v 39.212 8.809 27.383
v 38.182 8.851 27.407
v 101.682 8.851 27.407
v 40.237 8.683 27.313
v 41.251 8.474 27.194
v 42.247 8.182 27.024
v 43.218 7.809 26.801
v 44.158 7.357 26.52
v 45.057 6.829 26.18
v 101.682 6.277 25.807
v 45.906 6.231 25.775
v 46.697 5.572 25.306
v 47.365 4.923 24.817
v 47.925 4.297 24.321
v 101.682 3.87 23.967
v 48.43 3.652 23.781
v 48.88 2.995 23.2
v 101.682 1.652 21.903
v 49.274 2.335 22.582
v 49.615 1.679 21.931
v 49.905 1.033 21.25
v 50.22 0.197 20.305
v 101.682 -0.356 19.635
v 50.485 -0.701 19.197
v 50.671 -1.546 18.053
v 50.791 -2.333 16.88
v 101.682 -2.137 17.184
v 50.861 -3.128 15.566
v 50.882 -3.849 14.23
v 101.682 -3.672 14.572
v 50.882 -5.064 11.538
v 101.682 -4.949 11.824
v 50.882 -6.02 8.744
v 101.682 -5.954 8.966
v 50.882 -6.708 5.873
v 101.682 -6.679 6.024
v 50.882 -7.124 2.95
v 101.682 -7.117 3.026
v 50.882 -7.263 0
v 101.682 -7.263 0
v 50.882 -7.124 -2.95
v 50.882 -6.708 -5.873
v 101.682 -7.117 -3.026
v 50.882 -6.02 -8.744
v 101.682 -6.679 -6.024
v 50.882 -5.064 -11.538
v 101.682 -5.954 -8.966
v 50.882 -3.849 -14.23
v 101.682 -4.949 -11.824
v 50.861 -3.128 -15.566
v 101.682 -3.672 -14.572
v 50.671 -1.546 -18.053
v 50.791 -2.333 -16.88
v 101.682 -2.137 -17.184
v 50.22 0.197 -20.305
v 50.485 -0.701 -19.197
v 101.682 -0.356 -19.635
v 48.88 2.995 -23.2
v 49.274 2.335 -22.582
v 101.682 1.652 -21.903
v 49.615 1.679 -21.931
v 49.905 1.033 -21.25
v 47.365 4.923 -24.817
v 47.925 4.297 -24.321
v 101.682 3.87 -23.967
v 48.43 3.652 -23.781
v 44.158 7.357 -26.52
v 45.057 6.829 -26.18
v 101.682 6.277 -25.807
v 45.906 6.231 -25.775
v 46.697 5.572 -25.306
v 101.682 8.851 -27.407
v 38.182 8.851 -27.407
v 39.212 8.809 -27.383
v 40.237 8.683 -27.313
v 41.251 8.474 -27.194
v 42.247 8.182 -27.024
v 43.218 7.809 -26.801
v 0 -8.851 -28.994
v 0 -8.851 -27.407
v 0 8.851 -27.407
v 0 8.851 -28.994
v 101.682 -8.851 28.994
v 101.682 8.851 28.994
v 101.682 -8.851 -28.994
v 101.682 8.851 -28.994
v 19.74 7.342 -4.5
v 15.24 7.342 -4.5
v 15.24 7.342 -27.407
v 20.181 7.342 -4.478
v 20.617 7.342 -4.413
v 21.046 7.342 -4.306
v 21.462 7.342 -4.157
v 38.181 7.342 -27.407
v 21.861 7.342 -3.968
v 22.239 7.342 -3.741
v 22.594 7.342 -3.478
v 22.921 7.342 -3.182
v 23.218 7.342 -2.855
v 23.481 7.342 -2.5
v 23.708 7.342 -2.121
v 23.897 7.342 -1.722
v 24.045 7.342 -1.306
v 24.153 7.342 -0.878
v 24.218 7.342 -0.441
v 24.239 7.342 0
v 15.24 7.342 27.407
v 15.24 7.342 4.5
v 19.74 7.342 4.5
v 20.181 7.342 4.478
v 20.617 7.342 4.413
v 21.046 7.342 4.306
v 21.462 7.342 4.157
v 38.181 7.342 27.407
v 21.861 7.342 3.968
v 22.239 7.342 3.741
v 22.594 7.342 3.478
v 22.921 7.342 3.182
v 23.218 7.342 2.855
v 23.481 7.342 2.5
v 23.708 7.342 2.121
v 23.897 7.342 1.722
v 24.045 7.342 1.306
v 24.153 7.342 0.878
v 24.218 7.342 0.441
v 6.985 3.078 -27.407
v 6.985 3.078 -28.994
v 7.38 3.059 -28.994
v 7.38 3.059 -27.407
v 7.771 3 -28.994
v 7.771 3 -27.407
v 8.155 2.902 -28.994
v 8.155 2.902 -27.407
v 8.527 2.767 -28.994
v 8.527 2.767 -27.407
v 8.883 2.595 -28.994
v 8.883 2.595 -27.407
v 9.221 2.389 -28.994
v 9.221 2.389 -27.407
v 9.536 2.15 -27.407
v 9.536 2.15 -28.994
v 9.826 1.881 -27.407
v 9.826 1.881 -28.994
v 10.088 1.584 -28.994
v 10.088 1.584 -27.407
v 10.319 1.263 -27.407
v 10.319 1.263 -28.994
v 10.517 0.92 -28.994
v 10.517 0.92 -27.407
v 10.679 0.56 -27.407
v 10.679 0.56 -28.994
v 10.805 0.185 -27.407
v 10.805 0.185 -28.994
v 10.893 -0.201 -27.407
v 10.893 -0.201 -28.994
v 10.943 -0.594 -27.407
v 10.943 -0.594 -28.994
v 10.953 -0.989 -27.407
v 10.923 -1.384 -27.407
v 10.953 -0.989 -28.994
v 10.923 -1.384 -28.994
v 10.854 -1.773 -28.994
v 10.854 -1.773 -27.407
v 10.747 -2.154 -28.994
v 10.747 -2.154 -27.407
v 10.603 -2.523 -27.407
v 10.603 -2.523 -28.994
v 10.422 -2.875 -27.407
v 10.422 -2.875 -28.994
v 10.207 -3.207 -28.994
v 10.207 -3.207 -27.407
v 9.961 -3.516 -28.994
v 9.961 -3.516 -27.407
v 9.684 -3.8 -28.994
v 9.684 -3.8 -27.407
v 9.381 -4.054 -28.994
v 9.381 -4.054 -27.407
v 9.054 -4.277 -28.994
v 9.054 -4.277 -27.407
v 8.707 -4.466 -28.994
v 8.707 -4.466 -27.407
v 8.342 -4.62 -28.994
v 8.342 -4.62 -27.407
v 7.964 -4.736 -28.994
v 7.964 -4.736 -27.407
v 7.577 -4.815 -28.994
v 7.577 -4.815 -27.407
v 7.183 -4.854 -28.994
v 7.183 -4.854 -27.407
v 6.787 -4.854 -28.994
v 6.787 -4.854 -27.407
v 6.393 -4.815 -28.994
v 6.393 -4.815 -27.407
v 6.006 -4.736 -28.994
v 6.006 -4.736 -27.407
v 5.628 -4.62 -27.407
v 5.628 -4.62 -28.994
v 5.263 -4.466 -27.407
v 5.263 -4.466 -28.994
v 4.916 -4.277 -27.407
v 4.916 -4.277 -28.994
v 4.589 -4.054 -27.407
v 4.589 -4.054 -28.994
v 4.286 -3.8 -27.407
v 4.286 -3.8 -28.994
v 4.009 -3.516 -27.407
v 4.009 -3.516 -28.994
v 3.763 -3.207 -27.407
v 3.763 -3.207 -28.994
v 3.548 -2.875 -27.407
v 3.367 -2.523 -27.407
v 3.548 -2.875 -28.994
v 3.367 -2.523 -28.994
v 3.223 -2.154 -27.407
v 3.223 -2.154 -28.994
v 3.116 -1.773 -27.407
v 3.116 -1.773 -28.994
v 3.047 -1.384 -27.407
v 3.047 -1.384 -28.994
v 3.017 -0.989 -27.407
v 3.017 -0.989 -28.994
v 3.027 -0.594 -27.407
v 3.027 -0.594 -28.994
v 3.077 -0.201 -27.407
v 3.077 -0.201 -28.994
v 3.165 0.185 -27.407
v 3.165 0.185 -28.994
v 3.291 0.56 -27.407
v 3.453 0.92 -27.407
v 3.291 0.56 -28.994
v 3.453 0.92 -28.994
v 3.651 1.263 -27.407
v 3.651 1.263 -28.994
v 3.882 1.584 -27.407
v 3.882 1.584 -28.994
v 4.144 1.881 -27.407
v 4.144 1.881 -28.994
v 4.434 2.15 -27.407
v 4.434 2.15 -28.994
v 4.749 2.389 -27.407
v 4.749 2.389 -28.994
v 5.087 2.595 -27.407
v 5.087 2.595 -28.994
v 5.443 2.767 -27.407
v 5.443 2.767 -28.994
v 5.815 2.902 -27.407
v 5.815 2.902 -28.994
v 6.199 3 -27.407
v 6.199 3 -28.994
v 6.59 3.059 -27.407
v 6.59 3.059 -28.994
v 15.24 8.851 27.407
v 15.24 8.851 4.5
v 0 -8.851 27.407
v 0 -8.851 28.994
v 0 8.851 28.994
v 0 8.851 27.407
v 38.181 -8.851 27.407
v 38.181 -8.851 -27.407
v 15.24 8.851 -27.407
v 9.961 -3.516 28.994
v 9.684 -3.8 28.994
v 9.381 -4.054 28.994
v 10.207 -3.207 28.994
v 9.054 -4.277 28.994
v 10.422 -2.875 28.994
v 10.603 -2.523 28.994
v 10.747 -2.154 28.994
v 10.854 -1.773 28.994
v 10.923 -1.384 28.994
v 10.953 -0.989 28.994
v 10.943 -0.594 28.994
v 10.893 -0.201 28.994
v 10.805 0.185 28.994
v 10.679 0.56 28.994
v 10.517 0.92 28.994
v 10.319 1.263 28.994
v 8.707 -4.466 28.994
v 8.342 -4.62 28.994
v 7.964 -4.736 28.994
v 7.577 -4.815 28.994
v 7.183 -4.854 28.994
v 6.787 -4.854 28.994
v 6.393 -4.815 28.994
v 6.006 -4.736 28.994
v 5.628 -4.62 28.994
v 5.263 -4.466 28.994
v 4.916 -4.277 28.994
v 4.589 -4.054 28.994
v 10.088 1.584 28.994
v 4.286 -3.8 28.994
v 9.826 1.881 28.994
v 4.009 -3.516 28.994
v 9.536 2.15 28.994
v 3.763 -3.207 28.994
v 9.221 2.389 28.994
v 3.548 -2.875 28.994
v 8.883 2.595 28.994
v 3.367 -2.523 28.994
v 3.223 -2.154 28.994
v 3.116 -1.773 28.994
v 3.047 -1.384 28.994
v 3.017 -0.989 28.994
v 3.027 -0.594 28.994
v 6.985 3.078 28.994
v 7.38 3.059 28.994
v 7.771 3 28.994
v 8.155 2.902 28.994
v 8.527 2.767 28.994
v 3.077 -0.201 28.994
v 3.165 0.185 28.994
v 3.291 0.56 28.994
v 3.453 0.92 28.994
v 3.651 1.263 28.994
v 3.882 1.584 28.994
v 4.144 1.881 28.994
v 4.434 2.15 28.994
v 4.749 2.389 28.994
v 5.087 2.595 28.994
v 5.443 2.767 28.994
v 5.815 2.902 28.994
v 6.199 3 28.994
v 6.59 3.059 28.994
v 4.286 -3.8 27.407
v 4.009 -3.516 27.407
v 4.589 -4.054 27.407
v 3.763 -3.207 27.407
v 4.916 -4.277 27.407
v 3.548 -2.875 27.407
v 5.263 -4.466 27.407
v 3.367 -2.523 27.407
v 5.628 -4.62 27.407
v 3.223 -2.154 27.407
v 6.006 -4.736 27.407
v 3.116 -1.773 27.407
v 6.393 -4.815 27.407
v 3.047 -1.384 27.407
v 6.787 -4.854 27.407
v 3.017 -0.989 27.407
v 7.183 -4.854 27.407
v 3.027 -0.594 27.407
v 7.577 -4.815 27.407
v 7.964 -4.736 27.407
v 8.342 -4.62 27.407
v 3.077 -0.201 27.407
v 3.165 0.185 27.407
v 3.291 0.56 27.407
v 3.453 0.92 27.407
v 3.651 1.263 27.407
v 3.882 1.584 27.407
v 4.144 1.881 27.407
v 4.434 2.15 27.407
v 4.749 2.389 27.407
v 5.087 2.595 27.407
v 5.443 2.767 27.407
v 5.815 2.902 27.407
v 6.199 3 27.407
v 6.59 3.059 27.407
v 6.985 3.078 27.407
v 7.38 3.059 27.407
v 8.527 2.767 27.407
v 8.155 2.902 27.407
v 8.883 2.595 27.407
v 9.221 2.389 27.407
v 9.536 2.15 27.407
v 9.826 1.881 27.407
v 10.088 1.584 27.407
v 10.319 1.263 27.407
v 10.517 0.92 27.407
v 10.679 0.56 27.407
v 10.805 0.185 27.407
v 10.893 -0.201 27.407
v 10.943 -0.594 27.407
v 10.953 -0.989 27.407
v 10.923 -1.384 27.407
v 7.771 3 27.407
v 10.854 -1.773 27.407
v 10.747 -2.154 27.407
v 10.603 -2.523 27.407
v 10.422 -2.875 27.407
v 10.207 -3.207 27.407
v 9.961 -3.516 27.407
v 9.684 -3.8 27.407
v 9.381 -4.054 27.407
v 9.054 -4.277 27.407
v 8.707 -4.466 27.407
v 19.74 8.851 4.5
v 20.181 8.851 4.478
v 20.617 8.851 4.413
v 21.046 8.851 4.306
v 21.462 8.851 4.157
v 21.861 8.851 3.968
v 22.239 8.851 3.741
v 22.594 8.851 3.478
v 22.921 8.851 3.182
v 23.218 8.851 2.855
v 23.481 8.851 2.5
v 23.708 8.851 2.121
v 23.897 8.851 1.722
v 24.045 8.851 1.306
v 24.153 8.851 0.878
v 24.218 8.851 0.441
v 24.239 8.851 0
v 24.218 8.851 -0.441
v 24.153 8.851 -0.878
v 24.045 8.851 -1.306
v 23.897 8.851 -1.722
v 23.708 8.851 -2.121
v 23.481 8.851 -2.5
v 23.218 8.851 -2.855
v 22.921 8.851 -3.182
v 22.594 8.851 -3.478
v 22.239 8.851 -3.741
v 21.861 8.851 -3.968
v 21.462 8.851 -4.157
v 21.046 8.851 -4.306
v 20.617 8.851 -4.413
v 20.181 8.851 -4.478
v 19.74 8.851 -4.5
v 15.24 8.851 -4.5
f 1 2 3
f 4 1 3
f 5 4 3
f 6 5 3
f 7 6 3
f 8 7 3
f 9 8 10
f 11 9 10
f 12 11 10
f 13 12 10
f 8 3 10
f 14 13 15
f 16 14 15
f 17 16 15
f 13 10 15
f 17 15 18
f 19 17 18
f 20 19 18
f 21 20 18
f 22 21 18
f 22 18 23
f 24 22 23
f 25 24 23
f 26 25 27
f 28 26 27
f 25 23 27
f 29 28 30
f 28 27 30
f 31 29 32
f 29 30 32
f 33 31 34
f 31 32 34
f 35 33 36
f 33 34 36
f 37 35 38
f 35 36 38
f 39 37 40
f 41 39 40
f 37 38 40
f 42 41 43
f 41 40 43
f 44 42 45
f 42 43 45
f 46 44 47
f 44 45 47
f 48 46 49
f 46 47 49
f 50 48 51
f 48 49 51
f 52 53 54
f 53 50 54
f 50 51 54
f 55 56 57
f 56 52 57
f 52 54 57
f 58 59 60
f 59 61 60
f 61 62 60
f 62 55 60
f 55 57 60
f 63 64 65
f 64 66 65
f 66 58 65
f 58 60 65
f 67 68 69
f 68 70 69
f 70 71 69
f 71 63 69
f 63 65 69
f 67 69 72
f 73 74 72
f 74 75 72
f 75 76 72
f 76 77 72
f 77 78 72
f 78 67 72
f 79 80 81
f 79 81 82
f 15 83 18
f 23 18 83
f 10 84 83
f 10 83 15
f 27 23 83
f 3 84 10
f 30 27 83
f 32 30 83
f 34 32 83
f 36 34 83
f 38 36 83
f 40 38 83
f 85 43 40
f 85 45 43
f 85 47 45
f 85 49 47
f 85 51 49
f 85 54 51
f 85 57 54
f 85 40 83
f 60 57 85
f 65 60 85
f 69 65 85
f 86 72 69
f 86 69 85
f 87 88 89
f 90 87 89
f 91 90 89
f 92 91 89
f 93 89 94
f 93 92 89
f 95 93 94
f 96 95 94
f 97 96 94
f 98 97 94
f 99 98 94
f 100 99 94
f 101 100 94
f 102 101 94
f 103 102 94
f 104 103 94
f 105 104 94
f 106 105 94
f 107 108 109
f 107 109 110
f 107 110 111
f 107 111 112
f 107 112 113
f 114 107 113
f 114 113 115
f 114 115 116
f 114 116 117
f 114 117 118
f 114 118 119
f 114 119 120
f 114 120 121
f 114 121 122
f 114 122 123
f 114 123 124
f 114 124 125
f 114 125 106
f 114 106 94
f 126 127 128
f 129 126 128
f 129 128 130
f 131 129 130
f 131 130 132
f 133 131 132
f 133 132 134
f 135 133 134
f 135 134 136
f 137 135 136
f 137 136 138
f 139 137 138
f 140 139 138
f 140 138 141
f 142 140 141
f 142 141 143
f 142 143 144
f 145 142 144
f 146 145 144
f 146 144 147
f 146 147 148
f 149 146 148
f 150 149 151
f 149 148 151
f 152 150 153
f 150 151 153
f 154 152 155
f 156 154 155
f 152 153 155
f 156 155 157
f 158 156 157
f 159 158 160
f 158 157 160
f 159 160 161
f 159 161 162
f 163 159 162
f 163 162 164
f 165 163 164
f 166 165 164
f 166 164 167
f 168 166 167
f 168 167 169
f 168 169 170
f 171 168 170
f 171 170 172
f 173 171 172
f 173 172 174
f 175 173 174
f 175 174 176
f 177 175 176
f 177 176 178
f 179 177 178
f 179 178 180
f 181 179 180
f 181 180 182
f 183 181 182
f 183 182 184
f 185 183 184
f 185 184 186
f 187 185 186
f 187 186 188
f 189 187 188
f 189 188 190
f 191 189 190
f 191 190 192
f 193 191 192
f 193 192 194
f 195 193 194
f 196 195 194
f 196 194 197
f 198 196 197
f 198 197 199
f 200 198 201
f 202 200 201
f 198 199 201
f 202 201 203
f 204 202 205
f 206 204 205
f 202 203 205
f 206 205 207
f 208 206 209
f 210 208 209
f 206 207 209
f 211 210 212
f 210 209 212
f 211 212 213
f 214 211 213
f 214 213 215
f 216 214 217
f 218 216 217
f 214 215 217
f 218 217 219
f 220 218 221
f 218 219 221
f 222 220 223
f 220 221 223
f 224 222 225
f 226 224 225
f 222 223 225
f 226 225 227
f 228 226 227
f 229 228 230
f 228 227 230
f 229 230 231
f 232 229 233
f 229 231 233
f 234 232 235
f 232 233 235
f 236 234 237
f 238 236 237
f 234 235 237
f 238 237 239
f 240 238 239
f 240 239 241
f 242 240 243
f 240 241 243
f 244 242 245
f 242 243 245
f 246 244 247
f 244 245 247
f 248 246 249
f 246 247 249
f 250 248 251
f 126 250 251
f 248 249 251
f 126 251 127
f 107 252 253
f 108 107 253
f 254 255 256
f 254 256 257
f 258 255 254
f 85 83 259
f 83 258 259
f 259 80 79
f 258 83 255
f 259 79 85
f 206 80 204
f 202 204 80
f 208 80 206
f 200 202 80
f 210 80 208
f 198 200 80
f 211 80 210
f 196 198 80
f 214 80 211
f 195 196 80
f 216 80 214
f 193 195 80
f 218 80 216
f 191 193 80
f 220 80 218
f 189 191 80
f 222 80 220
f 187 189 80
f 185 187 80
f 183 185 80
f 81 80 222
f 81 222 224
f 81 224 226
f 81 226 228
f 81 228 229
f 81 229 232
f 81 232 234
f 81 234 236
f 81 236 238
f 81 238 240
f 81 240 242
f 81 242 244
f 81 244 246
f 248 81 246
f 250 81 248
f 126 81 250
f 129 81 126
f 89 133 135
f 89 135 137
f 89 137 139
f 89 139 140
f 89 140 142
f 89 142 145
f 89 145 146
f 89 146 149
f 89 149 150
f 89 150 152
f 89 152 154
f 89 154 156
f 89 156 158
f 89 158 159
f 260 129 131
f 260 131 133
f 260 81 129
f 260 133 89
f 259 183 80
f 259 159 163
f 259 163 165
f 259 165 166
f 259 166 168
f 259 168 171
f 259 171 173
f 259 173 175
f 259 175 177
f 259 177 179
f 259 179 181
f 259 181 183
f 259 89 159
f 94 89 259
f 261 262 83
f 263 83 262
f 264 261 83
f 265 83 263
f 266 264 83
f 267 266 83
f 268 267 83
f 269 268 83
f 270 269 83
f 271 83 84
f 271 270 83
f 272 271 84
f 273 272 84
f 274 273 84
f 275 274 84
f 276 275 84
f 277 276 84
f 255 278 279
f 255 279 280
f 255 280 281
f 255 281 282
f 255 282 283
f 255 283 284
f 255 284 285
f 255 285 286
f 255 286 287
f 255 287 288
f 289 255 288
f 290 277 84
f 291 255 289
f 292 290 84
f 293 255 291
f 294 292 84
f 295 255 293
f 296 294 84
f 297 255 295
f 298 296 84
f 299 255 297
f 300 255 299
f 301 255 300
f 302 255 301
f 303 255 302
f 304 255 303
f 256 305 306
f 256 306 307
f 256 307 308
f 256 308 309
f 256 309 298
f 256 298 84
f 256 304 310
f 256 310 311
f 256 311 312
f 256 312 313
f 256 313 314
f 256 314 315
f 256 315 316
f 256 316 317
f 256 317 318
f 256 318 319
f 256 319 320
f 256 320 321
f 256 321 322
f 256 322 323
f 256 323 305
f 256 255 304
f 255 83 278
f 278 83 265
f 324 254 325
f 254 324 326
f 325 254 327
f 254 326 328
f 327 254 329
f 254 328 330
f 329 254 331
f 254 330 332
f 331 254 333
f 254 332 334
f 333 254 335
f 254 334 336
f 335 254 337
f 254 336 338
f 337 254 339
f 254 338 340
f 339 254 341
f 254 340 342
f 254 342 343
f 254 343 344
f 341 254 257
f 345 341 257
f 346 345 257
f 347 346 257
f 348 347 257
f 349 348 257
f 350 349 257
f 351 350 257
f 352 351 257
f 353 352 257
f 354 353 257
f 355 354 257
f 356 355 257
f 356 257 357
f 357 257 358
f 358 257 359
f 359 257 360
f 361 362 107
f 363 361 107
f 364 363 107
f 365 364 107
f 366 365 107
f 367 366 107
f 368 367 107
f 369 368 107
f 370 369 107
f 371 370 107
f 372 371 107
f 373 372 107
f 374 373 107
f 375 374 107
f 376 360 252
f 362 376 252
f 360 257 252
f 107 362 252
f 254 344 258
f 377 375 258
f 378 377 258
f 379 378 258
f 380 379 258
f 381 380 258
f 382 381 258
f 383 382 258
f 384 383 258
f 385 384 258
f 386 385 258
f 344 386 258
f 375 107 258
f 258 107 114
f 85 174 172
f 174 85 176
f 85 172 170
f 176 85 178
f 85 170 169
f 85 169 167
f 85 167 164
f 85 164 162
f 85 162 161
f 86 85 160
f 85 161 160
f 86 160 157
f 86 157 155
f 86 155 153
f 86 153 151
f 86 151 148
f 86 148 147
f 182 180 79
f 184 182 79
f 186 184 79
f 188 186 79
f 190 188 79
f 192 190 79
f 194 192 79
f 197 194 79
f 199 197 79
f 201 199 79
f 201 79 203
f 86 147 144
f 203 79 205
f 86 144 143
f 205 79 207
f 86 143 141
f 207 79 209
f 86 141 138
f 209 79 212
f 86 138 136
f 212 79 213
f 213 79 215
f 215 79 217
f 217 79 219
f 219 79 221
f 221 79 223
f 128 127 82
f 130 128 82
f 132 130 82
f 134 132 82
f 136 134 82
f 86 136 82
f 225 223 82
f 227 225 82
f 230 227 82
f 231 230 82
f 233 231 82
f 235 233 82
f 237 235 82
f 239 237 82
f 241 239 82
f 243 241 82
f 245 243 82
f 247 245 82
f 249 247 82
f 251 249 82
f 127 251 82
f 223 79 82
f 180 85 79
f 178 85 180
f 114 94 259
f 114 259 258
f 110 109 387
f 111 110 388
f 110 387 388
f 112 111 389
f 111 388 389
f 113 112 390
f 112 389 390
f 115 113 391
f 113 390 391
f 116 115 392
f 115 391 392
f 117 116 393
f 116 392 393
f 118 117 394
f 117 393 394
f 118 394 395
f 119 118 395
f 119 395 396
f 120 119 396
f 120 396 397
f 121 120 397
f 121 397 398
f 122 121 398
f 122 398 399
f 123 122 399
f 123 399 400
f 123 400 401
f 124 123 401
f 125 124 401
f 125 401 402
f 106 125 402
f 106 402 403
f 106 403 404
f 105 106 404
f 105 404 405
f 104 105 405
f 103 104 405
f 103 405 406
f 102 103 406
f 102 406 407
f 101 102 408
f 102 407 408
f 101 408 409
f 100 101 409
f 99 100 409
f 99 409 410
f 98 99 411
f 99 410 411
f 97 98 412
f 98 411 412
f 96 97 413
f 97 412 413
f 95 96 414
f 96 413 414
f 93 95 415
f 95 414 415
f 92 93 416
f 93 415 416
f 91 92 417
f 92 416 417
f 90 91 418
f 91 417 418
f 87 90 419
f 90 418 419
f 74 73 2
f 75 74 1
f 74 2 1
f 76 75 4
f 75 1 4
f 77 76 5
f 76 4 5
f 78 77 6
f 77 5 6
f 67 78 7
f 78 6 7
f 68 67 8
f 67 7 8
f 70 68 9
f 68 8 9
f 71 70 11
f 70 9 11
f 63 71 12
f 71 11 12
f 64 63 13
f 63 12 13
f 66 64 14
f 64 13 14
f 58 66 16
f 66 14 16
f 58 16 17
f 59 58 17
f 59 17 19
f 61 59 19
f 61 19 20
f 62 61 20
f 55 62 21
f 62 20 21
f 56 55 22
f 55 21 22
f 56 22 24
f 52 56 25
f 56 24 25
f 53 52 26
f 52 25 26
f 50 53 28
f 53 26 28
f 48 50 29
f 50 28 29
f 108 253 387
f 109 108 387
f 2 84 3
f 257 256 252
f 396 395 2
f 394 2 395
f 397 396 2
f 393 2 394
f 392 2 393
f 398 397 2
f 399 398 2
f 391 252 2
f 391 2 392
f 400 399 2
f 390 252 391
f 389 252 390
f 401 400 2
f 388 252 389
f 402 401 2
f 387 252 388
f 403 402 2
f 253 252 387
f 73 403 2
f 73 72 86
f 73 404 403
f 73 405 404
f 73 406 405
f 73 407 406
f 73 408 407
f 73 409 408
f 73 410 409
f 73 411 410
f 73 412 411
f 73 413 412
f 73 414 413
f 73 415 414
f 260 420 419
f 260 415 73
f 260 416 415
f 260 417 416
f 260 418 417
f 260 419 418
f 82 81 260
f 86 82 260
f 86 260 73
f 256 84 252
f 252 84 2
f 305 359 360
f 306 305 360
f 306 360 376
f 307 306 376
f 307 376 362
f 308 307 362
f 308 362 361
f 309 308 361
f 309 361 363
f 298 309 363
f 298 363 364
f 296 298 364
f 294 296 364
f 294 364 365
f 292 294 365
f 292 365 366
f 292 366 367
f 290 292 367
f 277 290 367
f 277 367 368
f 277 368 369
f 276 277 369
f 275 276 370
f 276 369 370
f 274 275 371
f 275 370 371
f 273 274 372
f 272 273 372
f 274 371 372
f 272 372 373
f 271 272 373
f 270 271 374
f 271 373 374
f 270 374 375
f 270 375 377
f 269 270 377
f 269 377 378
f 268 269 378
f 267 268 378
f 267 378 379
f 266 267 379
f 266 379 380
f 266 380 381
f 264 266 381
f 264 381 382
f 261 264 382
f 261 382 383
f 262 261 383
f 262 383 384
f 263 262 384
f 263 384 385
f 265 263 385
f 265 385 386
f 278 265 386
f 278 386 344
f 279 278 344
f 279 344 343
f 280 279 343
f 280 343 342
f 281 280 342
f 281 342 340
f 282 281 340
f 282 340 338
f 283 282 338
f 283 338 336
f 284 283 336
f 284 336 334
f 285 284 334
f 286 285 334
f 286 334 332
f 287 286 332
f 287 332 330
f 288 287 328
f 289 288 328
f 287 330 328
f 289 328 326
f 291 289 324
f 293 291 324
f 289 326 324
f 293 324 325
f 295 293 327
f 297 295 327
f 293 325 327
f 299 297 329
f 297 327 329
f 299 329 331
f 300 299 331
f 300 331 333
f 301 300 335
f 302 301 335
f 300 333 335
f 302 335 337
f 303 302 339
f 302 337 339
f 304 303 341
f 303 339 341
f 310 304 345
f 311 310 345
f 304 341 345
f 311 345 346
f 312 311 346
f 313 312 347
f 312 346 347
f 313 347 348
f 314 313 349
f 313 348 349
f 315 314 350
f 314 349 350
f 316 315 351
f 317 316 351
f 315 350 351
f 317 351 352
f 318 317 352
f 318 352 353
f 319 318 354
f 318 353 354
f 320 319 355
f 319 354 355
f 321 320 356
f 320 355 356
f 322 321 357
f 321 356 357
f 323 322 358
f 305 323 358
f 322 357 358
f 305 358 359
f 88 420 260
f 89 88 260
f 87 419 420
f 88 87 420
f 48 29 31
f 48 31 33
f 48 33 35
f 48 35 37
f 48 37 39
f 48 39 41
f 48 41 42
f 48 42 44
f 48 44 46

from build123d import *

# Parameters (mm, degrees)
SKETCH1_W                = 57.9882
SKETCH1_H                = 17.70126
BOSS_EXTRUDE1_DEPTH      = 101.681600523
SKETCH5_W                = 15.24
SKETCH5_H                = 54.8132
CUT_EXTRUDE1_DEPTH       = 127
SKETCH6_R                = 4.49961
CUT_EXTRUDE2_DEPTH       = 127
CUT_EXTRUDE13_DEPTH      = 50.8
FILLET5_R                = 12.7
SKETCH14_R               = 3.96875
CUT_EXTRUDE14_DEPTH      = 88.9
CUT_EXTRUDE16_DEPTH      = 108.20606489
CUT_EXTRUDE16_DEPTH_BACK = 16.1925


with BuildPart() as part:
    # Sketch1 → Boss-Extrude1 (new body)
    with BuildSketch(Plane(origin=(0, 0, 0), x_dir=(0, 0, -1), z_dir=(1, 0, 0))):
        Rectangle(SKETCH1_W, SKETCH1_H)
    extrude(amount=BOSS_EXTRUDE1_DEPTH)

    # Sketch5 → Cut-Extrude1 (cut)
    with BuildSketch(Plane(origin=(0, 8.85063, 0), x_dir=(1, 0, 0), z_dir=(0, 1, 0))):
        with Locations((7.62, 0)):
            Rectangle(SKETCH5_W, SKETCH5_H)
    extrude(amount=-CUT_EXTRUDE1_DEPTH, mode=Mode.SUBTRACT)

    # Sketch6 → Cut-Extrude2 (cut)
    with BuildSketch(Plane(origin=(0, 8.85063, 0), x_dir=(1, 0, 0), z_dir=(0, 1, 0))):
        with BuildLine():
            ThreePointArc((15.24, 0), (16.557905256, 3.181704744), (19.73961, 4.49961))
            Line((19.73961, 4.49961), (15.24, 4.49961))
            Line((15.24, 4.49961), (15.24, 0))
        make_face()
        with Locations((19.73961, 0)):
            Circle(SKETCH6_R)
        with BuildLine():
            ThreePointArc((19.73961, -4.49961), (16.557905256, -3.181704744), (15.24, 0))
            Line((15.24, 0), (15.24, -4.49961))
            Line((15.24, -4.49961), (19.73961, -4.49961))
        make_face()
    extrude(amount=-CUT_EXTRUDE2_DEPTH, mode=Mode.SUBTRACT)

    # Sketch7 → Cut-Extrude13 (cut)
    with BuildSketch(Plane(origin=(101.681600523, 0, 0), x_dir=(0, 0, -1), z_dir=(1, 0, 0))):
        with BuildLine():
            Line((27.4066, 8.85063), (-27.4066, 8.85063))
            ThreePointArc((-27.4066, 8.85063), (0, -7.26313), (27.4066, 8.85063))
        make_face()
    extrude(amount=-CUT_EXTRUDE13_DEPTH, mode=Mode.SUBTRACT)

    # Fillet5
    fillet5_edges = [part.edges().sort_by_distance(p)[0] for p in [
        (50.881600523, 8.85063, 0),
    ]]
    fillet(fillet5_edges, radius=FILLET5_R)

    # Sketch14 → Cut-Extrude14 (cut)
    with BuildSketch(Plane(origin=(0, 0, -28.9941), x_dir=(-1, 0, 0), z_dir=(0, 0, -1))):
        with Locations(Location((-6.985, -0.89027, 0), (0, 0, 90))):
            Circle(SKETCH14_R)
    extrude(amount=-CUT_EXTRUDE14_DEPTH, mode=Mode.SUBTRACT)

    # Sketch18 → Cut-Extrude16 (cut, two sides: drawn at the far end of the back side and taken through both)
    with BuildSketch(Plane.XZ.offset(8.85063).offset(-CUT_EXTRUDE16_DEPTH_BACK)):
        with BuildLine():
            Line((38.18128, -27.4066), (38.18128, 27.4066))
            Line((38.18128, 27.4066), (15.24, 27.4066))
            Line((15.24, 27.4066), (15.24, 4.49961))
            Line((15.24, 4.49961), (19.73961, 4.49961))
            ThreePointArc((19.73961, 4.49961), (24.23922, 0), (19.73961, -4.49961))
            Line((19.73961, -4.49961), (15.24, -4.49961))
            Line((15.24, -4.49961), (15.24, -27.4066))
            Line((15.24, -27.4066), (38.18128, -27.4066))
        make_face()
    extrude(amount=CUT_EXTRUDE16_DEPTH + CUT_EXTRUDE16_DEPTH_BACK, mode=Mode.SUBTRACT)


solid = part.part
